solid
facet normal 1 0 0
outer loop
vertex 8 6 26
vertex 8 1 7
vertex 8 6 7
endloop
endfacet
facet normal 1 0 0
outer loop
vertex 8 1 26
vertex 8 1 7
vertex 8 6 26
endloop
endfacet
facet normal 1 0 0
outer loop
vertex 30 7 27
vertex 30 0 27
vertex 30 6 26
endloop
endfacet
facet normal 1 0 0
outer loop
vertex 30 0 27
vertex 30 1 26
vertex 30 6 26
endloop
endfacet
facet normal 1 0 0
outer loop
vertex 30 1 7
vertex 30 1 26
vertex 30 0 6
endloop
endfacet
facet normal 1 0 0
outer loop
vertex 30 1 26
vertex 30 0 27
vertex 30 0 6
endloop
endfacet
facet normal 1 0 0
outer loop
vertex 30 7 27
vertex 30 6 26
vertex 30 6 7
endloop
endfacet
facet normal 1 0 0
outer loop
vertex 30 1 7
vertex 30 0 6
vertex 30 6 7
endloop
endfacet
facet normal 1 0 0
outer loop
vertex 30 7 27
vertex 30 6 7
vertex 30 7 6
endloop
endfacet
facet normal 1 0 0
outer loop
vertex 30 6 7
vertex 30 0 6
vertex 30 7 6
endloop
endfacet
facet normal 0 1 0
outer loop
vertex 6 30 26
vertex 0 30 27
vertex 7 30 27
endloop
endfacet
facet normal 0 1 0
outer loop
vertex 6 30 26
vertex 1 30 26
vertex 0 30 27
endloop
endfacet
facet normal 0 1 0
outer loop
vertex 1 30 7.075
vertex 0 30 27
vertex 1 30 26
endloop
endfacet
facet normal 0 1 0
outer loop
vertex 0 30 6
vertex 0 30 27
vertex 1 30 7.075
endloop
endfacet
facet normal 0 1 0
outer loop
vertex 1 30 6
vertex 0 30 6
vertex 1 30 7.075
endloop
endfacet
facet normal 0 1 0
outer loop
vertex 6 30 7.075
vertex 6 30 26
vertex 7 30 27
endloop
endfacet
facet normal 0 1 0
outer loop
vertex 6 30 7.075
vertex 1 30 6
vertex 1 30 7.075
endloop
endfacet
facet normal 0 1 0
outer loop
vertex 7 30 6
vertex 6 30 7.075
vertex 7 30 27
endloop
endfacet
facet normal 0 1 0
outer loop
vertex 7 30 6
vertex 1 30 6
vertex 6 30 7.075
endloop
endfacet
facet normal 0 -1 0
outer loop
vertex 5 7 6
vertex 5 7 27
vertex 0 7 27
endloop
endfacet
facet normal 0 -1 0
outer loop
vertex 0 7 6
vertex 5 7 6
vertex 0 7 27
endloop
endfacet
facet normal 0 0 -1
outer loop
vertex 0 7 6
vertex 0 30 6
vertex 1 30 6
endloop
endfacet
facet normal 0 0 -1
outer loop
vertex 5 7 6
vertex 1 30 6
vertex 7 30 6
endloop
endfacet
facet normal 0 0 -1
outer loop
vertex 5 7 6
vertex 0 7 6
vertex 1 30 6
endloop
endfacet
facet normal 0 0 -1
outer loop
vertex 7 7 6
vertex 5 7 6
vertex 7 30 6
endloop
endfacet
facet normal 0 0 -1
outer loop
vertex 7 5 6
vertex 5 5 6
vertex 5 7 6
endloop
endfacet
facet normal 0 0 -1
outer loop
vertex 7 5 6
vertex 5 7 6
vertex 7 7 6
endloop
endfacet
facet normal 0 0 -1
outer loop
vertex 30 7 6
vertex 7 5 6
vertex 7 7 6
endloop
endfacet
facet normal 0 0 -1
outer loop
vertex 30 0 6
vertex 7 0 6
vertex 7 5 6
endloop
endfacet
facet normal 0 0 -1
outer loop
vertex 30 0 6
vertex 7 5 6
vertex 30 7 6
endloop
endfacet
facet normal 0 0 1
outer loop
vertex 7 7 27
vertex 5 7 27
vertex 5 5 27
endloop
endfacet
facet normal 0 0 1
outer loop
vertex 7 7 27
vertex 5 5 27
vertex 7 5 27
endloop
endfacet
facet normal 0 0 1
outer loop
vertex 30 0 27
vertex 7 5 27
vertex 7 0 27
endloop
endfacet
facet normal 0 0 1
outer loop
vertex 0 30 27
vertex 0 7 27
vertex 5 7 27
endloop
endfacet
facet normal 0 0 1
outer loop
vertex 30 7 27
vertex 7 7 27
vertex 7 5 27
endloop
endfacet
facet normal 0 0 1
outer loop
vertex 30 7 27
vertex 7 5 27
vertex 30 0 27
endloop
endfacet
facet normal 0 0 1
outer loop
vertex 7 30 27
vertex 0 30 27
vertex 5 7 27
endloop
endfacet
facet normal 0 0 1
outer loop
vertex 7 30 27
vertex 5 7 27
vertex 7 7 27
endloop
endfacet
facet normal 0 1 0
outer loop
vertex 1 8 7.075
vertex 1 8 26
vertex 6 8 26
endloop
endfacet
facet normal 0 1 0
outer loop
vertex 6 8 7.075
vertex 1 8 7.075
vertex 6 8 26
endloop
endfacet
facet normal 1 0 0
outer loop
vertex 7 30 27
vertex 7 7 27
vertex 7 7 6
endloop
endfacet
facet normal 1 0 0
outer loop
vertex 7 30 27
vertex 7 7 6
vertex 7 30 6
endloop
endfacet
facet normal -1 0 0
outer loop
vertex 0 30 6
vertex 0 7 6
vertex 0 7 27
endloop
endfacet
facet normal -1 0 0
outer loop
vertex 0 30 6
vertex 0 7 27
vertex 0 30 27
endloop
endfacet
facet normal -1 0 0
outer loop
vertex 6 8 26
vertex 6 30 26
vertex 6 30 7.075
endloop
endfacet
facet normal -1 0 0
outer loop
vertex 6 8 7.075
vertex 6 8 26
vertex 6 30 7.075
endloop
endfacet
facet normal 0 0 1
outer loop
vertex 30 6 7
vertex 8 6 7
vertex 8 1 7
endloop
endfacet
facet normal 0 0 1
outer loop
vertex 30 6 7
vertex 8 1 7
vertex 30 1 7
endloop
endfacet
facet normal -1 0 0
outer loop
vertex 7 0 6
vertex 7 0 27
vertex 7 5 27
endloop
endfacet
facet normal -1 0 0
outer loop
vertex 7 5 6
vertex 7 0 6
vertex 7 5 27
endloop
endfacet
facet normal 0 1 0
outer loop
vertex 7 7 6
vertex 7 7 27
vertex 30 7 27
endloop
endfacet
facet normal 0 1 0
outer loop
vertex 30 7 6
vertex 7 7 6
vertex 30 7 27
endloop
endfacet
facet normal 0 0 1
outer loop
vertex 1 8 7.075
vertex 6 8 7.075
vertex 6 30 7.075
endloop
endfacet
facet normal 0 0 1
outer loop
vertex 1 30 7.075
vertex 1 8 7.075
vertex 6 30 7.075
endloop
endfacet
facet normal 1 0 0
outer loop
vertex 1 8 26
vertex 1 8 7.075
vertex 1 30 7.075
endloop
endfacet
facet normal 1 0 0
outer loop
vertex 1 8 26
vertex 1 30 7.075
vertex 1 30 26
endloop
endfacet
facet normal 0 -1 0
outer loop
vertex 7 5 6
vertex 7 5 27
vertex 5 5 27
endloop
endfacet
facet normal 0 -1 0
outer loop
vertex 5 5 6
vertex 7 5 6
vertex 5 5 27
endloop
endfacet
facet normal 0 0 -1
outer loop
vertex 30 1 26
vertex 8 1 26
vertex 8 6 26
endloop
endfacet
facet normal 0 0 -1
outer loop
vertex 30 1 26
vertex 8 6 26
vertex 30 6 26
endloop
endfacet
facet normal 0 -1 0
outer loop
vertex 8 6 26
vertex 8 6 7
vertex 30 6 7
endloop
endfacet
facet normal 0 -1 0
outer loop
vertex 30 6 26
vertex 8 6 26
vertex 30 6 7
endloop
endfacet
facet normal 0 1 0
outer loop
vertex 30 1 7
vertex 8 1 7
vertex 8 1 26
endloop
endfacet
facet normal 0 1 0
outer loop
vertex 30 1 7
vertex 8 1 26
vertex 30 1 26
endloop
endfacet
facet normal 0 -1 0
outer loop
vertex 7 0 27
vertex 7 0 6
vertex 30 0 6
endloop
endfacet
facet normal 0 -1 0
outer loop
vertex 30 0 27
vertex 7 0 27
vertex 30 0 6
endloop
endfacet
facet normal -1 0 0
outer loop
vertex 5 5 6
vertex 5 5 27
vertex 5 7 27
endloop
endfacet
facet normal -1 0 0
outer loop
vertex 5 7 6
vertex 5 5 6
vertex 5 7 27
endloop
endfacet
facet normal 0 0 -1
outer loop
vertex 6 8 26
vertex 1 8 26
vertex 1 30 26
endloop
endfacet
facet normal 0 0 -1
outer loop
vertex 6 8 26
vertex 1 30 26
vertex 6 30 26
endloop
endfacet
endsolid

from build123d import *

# Parameters (mm, degrees)
SKETCH1_W           = 30
SKETCH1_H           = 30
BOSS_EXTRUDE1_DEPTH = 7
SKETCH2_W           = 7
SKETCH2_H           = 23
BOSS_EXTRUDE4_DEPTH = 20
SKETCH4_W           = 2
SKETCH4_H           = 2
BOSS_EXTRUDE6_DEPTH = 20
SKETCH5_W           = 23
SKETCH5_H           = 7
BOSS_EXTRUDE7_DEPTH = 20
SHELL2_START        = 8
SHELL2_DEPTH        = 22
SHELL2_START_2      = 1
SHELL2_2_DEPTH      = 5
SHELL2_START_3      = 6
SHELL2_3_OUTLINE_W  = 29
SHELL2_3_OUTLINE_H  = 5
SHELL2_3_DEPTH      = 2
SKETCH7_W           = 23
SKETCH7_H           = 1
BOSS_EXTRUDE8_DEPTH = 5
SKETCH9_W           = 1.075143629
SKETCH9_H           = 23
BOSS_EXTRUDE9_DEPTH = 5
SKETCH10_W          = 30
SKETCH10_H          = 30
CUT_EXTRUDE1_DEPTH  = 6
CUT_EXTRUDE2_DEPTH  = 6
SKETCH12_W          = 23
SKETCH12_H          = 23
CUT_EXTRUDE3_DEPTH  = 6


# Read off the part's stored shape, not the designer's step: Shell2
with BuildPart() as part:
    # Sketch1 → Boss-Extrude1 (new body)
    with BuildSketch(Plane.XY):
        with Locations((15, 15)):
            Rectangle(SKETCH1_W, SKETCH1_H)
    extrude(amount=BOSS_EXTRUDE1_DEPTH)

    # Sketch2 → Boss-Extrude4 (add)
    with BuildSketch(Plane.XY.offset(7)):
        with Locations((3.5, 18.5)):
            Rectangle(SKETCH2_W, SKETCH2_H)
    extrude(amount=BOSS_EXTRUDE4_DEPTH)

    # Sketch4 → Boss-Extrude6 (add)
    with BuildSketch(Plane.XY.offset(7)):
        with Locations((6, 6)):
            Rectangle(SKETCH4_W, SKETCH4_H)
    extrude(amount=BOSS_EXTRUDE6_DEPTH)

    # Sketch5 → Boss-Extrude7 (add)
    with BuildSketch(Plane.XY.offset(7)):
        with Locations((18.5, 3.5)):
            Rectangle(SKETCH5_W, SKETCH5_H)
    extrude(amount=BOSS_EXTRUDE7_DEPTH)

    # Shell2 outline → Shell2 (cut)
    with BuildSketch(Plane(origin=(0, 0, 0), x_dir=(1, 0, 0), z_dir=(0, 1, 0)).offset(SHELL2_START)):
        Polygon((6, -6), (30, -6), (30, -1), (1, -1), (1, -26), (6, -26), align=None)
    extrude(amount=SHELL2_DEPTH, mode=Mode.SUBTRACT)

    # Shell2 2 outline → Shell2 2 (cut)
    with BuildSketch(Plane(origin=(0, 0, 0), x_dir=(1, 0, 0), z_dir=(0, 1, 0)).offset(SHELL2_START_2)):
        Polygon((8, -6), (8, -26), (30, -26), (30, -1), (1, -1), (1, -6), align=None)
    extrude(amount=SHELL2_2_DEPTH, mode=Mode.SUBTRACT)

    # Shell2 3 outline → Shell2 3 (cut)
    with BuildSketch(Plane(origin=(0, 0, 0), x_dir=(1, 0, 0), z_dir=(0, 1, 0)).offset(SHELL2_START_3)):
        with Locations((15.5, -3.5)):
            Rectangle(SHELL2_3_OUTLINE_W, SHELL2_3_OUTLINE_H)
    extrude(amount=SHELL2_3_DEPTH, mode=Mode.SUBTRACT)

    # Sketch7 → Boss-Extrude8 (add)
    with BuildSketch(Plane.XZ.offset(-6)):
        with Locations((18.5, 6.5)):
            Rectangle(SKETCH7_W, SKETCH7_H)
    extrude(amount=BOSS_EXTRUDE8_DEPTH)

    # Sketch9 → Boss-Extrude9 (add)
    with BuildSketch(Plane.ZY.offset(-6)):
        with Locations((6.537571814, 18.5)):
            Rectangle(SKETCH9_W, SKETCH9_H)
    extrude(amount=BOSS_EXTRUDE9_DEPTH)

    # Sketch10 → Cut-Extrude1 (cut)
    with BuildSketch(Plane(origin=(0, 0, 0), x_dir=(-1, 0, 0), z_dir=(0, 0, -1))):
        with Locations((-15, 15)):
            Rectangle(SKETCH10_W, SKETCH10_H)
    extrude(amount=-CUT_EXTRUDE1_DEPTH, mode=Mode.SUBTRACT)

    # Sketch11 → Cut-Extrude2 (cut)
    with BuildSketch(Plane.XY.offset(7)):
        Polygon((7, 0), (7, 5), (5, 5), (5, 7), (0, 7), (0, 0), align=None)
    extrude(amount=-CUT_EXTRUDE2_DEPTH, mode=Mode.SUBTRACT)

    # Sketch12 → Cut-Extrude3 (cut)
    with BuildSketch(Plane.XY.offset(7)):
        with Locations((18.5, 18.5)):
            Rectangle(SKETCH12_W, SKETCH12_H)
    extrude(amount=-CUT_EXTRUDE3_DEPTH, mode=Mode.SUBTRACT)


solid = part.part
